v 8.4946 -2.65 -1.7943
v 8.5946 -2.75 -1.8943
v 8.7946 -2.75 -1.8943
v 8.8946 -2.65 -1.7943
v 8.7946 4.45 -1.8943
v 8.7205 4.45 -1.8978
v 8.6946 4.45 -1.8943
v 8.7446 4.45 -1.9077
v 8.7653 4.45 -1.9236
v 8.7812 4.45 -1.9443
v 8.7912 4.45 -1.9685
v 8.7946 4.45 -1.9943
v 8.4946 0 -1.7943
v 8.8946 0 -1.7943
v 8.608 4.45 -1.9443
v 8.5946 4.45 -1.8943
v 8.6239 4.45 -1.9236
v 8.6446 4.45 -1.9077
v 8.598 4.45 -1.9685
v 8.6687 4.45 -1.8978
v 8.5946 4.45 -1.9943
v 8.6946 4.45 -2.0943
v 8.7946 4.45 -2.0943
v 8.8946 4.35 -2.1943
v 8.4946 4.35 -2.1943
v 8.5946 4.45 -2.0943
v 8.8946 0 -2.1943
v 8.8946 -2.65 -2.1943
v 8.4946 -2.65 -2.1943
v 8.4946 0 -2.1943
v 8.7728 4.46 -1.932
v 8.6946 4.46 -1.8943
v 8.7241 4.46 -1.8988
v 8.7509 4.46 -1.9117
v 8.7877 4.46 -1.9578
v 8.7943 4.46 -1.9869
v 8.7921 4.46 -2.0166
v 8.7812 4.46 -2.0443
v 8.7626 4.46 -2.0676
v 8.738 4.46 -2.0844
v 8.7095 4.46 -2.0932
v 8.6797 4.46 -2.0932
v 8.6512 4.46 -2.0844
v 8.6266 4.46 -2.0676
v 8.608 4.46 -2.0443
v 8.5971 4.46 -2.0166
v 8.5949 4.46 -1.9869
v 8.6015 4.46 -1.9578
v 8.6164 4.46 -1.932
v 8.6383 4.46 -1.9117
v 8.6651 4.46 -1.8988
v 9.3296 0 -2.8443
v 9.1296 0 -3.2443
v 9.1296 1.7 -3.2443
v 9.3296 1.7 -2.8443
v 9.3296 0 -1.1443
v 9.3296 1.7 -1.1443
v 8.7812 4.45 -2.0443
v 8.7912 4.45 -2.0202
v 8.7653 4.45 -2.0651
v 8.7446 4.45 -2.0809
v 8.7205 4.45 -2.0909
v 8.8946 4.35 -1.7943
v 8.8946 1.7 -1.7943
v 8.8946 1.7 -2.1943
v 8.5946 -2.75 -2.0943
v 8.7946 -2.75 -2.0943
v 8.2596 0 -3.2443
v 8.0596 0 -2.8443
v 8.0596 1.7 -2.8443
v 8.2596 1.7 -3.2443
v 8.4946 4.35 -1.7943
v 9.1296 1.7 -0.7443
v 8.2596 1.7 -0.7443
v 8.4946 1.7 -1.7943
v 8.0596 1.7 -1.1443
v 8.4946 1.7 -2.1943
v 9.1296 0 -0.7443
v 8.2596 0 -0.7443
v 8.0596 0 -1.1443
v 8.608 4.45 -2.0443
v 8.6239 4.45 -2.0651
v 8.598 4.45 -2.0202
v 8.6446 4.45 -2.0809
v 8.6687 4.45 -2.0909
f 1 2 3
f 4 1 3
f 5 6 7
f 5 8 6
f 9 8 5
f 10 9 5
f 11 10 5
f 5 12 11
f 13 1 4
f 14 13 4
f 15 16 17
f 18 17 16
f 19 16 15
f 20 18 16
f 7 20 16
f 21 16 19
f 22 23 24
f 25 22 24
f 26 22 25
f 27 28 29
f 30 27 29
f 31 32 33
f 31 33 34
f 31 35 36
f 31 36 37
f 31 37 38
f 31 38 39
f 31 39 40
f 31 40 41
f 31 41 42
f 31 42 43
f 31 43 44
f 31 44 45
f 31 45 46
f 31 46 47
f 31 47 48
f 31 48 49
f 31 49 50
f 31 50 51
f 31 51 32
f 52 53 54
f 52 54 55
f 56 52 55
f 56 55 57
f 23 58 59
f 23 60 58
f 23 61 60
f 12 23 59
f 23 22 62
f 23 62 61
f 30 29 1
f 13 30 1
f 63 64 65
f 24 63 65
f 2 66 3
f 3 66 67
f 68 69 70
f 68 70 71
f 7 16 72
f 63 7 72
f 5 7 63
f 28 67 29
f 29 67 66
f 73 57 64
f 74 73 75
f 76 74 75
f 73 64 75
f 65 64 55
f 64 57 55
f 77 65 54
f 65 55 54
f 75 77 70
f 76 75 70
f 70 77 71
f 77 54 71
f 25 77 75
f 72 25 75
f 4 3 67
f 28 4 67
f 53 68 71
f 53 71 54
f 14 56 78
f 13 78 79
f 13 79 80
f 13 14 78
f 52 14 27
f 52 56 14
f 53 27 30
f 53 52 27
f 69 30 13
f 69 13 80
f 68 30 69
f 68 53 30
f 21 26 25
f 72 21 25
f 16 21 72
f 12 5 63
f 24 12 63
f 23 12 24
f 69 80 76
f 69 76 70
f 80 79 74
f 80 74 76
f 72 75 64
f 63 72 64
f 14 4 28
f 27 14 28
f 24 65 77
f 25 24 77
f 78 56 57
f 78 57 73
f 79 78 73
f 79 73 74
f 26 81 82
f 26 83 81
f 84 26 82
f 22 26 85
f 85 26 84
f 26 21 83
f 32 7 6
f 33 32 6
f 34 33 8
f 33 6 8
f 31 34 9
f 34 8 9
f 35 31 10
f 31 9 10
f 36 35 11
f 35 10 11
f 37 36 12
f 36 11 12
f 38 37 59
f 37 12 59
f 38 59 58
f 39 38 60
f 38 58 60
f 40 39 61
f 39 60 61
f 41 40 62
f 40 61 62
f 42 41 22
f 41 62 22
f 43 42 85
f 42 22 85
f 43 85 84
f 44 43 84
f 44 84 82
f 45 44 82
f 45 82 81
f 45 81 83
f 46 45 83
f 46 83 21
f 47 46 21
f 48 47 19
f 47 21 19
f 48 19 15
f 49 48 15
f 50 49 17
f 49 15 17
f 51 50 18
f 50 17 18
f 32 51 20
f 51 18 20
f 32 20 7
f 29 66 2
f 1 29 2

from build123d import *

# Parameters (mm, degrees)
EXTRUDE_1_DEPTH      = 1.7
EXTRUDE_2_DEPTH      = 2.75
EXTRUDE_2_DEPTH_BACK = 4.45
CHAMFER_1_SIZE       = 0.1
CHAMFER_2_SIZE       = 0.1
SKETCH_3_R           = 0.1
EXTRUDE_3_DEPTH      = 0.01


with BuildPart() as part:
    # 草图1 → 凸台-拉伸1 (new body)
    with BuildSketch(Plane(origin=(0, 0, 0), x_dir=(1, 0, 0), z_dir=(0, 1, 0))):
        Polygon((8.059615848, 1.144344533), (8.059615848, 2.844344533), (8.259615848, 3.244344533), (9.129615848, 3.244344533), (9.329615848, 2.844344533), (9.329615848, 1.144344533), (9.129615848, 0.744344533), (8.259615848, 0.744344533), align=None)
    extrude(amount=EXTRUDE_1_DEPTH)

    # 草图2 → 凸台-拉伸2 (add, two sides: drawn at the far end of the back side and taken through both)
    with BuildSketch(Plane(origin=(0, 1.7, 0), x_dir=(1, 0, 0), z_dir=(0, 1, 0)).offset(-EXTRUDE_2_DEPTH_BACK)):
        Polygon((8.694615848, 2.194344533), (8.494615848, 2.194344533), (8.494615848, 1.794344533), (8.894615848, 1.794344533), (8.894615848, 2.194344533), align=None)
    extrude(amount=EXTRUDE_2_DEPTH + EXTRUDE_2_DEPTH_BACK)

    # 倒角1
    chamfer_1_edges = [part.edges().sort_by_distance(p)[0] for p in [
        (8.694615848, 4.45, -2.194344533),
        (8.494615848, 4.45, -1.994344533),
        (8.694615848, 4.45, -1.794344533),
        (8.894615848, 4.45, -1.994344533),
    ]]
    chamfer(chamfer_1_edges, length=CHAMFER_1_SIZE)

    # 倒角2
    chamfer_2_edges = [part.edges().sort_by_distance(p)[0] for p in [
        (8.894615848, -2.75, -1.994344533),
        (8.694615848, -2.75, -1.794344533),
        (8.494615848, -2.75, -1.994344533),
        (8.694615848, -2.75, -2.194344533),
    ]]
    chamfer(chamfer_2_edges, length=CHAMFER_2_SIZE)

    # 草图3 → 凸台-拉伸3 (add)
    with BuildSketch(Plane(origin=(0, 4.45, 0), x_dir=(1, 0, 0), z_dir=(0, 1, 0))):
        with Locations(Location((8.694615848, 1.994344533, 0), (0, 0, 270))):
            Circle(SKETCH_3_R)
    extrude(amount=EXTRUDE_3_DEPTH)


solid = part.part
